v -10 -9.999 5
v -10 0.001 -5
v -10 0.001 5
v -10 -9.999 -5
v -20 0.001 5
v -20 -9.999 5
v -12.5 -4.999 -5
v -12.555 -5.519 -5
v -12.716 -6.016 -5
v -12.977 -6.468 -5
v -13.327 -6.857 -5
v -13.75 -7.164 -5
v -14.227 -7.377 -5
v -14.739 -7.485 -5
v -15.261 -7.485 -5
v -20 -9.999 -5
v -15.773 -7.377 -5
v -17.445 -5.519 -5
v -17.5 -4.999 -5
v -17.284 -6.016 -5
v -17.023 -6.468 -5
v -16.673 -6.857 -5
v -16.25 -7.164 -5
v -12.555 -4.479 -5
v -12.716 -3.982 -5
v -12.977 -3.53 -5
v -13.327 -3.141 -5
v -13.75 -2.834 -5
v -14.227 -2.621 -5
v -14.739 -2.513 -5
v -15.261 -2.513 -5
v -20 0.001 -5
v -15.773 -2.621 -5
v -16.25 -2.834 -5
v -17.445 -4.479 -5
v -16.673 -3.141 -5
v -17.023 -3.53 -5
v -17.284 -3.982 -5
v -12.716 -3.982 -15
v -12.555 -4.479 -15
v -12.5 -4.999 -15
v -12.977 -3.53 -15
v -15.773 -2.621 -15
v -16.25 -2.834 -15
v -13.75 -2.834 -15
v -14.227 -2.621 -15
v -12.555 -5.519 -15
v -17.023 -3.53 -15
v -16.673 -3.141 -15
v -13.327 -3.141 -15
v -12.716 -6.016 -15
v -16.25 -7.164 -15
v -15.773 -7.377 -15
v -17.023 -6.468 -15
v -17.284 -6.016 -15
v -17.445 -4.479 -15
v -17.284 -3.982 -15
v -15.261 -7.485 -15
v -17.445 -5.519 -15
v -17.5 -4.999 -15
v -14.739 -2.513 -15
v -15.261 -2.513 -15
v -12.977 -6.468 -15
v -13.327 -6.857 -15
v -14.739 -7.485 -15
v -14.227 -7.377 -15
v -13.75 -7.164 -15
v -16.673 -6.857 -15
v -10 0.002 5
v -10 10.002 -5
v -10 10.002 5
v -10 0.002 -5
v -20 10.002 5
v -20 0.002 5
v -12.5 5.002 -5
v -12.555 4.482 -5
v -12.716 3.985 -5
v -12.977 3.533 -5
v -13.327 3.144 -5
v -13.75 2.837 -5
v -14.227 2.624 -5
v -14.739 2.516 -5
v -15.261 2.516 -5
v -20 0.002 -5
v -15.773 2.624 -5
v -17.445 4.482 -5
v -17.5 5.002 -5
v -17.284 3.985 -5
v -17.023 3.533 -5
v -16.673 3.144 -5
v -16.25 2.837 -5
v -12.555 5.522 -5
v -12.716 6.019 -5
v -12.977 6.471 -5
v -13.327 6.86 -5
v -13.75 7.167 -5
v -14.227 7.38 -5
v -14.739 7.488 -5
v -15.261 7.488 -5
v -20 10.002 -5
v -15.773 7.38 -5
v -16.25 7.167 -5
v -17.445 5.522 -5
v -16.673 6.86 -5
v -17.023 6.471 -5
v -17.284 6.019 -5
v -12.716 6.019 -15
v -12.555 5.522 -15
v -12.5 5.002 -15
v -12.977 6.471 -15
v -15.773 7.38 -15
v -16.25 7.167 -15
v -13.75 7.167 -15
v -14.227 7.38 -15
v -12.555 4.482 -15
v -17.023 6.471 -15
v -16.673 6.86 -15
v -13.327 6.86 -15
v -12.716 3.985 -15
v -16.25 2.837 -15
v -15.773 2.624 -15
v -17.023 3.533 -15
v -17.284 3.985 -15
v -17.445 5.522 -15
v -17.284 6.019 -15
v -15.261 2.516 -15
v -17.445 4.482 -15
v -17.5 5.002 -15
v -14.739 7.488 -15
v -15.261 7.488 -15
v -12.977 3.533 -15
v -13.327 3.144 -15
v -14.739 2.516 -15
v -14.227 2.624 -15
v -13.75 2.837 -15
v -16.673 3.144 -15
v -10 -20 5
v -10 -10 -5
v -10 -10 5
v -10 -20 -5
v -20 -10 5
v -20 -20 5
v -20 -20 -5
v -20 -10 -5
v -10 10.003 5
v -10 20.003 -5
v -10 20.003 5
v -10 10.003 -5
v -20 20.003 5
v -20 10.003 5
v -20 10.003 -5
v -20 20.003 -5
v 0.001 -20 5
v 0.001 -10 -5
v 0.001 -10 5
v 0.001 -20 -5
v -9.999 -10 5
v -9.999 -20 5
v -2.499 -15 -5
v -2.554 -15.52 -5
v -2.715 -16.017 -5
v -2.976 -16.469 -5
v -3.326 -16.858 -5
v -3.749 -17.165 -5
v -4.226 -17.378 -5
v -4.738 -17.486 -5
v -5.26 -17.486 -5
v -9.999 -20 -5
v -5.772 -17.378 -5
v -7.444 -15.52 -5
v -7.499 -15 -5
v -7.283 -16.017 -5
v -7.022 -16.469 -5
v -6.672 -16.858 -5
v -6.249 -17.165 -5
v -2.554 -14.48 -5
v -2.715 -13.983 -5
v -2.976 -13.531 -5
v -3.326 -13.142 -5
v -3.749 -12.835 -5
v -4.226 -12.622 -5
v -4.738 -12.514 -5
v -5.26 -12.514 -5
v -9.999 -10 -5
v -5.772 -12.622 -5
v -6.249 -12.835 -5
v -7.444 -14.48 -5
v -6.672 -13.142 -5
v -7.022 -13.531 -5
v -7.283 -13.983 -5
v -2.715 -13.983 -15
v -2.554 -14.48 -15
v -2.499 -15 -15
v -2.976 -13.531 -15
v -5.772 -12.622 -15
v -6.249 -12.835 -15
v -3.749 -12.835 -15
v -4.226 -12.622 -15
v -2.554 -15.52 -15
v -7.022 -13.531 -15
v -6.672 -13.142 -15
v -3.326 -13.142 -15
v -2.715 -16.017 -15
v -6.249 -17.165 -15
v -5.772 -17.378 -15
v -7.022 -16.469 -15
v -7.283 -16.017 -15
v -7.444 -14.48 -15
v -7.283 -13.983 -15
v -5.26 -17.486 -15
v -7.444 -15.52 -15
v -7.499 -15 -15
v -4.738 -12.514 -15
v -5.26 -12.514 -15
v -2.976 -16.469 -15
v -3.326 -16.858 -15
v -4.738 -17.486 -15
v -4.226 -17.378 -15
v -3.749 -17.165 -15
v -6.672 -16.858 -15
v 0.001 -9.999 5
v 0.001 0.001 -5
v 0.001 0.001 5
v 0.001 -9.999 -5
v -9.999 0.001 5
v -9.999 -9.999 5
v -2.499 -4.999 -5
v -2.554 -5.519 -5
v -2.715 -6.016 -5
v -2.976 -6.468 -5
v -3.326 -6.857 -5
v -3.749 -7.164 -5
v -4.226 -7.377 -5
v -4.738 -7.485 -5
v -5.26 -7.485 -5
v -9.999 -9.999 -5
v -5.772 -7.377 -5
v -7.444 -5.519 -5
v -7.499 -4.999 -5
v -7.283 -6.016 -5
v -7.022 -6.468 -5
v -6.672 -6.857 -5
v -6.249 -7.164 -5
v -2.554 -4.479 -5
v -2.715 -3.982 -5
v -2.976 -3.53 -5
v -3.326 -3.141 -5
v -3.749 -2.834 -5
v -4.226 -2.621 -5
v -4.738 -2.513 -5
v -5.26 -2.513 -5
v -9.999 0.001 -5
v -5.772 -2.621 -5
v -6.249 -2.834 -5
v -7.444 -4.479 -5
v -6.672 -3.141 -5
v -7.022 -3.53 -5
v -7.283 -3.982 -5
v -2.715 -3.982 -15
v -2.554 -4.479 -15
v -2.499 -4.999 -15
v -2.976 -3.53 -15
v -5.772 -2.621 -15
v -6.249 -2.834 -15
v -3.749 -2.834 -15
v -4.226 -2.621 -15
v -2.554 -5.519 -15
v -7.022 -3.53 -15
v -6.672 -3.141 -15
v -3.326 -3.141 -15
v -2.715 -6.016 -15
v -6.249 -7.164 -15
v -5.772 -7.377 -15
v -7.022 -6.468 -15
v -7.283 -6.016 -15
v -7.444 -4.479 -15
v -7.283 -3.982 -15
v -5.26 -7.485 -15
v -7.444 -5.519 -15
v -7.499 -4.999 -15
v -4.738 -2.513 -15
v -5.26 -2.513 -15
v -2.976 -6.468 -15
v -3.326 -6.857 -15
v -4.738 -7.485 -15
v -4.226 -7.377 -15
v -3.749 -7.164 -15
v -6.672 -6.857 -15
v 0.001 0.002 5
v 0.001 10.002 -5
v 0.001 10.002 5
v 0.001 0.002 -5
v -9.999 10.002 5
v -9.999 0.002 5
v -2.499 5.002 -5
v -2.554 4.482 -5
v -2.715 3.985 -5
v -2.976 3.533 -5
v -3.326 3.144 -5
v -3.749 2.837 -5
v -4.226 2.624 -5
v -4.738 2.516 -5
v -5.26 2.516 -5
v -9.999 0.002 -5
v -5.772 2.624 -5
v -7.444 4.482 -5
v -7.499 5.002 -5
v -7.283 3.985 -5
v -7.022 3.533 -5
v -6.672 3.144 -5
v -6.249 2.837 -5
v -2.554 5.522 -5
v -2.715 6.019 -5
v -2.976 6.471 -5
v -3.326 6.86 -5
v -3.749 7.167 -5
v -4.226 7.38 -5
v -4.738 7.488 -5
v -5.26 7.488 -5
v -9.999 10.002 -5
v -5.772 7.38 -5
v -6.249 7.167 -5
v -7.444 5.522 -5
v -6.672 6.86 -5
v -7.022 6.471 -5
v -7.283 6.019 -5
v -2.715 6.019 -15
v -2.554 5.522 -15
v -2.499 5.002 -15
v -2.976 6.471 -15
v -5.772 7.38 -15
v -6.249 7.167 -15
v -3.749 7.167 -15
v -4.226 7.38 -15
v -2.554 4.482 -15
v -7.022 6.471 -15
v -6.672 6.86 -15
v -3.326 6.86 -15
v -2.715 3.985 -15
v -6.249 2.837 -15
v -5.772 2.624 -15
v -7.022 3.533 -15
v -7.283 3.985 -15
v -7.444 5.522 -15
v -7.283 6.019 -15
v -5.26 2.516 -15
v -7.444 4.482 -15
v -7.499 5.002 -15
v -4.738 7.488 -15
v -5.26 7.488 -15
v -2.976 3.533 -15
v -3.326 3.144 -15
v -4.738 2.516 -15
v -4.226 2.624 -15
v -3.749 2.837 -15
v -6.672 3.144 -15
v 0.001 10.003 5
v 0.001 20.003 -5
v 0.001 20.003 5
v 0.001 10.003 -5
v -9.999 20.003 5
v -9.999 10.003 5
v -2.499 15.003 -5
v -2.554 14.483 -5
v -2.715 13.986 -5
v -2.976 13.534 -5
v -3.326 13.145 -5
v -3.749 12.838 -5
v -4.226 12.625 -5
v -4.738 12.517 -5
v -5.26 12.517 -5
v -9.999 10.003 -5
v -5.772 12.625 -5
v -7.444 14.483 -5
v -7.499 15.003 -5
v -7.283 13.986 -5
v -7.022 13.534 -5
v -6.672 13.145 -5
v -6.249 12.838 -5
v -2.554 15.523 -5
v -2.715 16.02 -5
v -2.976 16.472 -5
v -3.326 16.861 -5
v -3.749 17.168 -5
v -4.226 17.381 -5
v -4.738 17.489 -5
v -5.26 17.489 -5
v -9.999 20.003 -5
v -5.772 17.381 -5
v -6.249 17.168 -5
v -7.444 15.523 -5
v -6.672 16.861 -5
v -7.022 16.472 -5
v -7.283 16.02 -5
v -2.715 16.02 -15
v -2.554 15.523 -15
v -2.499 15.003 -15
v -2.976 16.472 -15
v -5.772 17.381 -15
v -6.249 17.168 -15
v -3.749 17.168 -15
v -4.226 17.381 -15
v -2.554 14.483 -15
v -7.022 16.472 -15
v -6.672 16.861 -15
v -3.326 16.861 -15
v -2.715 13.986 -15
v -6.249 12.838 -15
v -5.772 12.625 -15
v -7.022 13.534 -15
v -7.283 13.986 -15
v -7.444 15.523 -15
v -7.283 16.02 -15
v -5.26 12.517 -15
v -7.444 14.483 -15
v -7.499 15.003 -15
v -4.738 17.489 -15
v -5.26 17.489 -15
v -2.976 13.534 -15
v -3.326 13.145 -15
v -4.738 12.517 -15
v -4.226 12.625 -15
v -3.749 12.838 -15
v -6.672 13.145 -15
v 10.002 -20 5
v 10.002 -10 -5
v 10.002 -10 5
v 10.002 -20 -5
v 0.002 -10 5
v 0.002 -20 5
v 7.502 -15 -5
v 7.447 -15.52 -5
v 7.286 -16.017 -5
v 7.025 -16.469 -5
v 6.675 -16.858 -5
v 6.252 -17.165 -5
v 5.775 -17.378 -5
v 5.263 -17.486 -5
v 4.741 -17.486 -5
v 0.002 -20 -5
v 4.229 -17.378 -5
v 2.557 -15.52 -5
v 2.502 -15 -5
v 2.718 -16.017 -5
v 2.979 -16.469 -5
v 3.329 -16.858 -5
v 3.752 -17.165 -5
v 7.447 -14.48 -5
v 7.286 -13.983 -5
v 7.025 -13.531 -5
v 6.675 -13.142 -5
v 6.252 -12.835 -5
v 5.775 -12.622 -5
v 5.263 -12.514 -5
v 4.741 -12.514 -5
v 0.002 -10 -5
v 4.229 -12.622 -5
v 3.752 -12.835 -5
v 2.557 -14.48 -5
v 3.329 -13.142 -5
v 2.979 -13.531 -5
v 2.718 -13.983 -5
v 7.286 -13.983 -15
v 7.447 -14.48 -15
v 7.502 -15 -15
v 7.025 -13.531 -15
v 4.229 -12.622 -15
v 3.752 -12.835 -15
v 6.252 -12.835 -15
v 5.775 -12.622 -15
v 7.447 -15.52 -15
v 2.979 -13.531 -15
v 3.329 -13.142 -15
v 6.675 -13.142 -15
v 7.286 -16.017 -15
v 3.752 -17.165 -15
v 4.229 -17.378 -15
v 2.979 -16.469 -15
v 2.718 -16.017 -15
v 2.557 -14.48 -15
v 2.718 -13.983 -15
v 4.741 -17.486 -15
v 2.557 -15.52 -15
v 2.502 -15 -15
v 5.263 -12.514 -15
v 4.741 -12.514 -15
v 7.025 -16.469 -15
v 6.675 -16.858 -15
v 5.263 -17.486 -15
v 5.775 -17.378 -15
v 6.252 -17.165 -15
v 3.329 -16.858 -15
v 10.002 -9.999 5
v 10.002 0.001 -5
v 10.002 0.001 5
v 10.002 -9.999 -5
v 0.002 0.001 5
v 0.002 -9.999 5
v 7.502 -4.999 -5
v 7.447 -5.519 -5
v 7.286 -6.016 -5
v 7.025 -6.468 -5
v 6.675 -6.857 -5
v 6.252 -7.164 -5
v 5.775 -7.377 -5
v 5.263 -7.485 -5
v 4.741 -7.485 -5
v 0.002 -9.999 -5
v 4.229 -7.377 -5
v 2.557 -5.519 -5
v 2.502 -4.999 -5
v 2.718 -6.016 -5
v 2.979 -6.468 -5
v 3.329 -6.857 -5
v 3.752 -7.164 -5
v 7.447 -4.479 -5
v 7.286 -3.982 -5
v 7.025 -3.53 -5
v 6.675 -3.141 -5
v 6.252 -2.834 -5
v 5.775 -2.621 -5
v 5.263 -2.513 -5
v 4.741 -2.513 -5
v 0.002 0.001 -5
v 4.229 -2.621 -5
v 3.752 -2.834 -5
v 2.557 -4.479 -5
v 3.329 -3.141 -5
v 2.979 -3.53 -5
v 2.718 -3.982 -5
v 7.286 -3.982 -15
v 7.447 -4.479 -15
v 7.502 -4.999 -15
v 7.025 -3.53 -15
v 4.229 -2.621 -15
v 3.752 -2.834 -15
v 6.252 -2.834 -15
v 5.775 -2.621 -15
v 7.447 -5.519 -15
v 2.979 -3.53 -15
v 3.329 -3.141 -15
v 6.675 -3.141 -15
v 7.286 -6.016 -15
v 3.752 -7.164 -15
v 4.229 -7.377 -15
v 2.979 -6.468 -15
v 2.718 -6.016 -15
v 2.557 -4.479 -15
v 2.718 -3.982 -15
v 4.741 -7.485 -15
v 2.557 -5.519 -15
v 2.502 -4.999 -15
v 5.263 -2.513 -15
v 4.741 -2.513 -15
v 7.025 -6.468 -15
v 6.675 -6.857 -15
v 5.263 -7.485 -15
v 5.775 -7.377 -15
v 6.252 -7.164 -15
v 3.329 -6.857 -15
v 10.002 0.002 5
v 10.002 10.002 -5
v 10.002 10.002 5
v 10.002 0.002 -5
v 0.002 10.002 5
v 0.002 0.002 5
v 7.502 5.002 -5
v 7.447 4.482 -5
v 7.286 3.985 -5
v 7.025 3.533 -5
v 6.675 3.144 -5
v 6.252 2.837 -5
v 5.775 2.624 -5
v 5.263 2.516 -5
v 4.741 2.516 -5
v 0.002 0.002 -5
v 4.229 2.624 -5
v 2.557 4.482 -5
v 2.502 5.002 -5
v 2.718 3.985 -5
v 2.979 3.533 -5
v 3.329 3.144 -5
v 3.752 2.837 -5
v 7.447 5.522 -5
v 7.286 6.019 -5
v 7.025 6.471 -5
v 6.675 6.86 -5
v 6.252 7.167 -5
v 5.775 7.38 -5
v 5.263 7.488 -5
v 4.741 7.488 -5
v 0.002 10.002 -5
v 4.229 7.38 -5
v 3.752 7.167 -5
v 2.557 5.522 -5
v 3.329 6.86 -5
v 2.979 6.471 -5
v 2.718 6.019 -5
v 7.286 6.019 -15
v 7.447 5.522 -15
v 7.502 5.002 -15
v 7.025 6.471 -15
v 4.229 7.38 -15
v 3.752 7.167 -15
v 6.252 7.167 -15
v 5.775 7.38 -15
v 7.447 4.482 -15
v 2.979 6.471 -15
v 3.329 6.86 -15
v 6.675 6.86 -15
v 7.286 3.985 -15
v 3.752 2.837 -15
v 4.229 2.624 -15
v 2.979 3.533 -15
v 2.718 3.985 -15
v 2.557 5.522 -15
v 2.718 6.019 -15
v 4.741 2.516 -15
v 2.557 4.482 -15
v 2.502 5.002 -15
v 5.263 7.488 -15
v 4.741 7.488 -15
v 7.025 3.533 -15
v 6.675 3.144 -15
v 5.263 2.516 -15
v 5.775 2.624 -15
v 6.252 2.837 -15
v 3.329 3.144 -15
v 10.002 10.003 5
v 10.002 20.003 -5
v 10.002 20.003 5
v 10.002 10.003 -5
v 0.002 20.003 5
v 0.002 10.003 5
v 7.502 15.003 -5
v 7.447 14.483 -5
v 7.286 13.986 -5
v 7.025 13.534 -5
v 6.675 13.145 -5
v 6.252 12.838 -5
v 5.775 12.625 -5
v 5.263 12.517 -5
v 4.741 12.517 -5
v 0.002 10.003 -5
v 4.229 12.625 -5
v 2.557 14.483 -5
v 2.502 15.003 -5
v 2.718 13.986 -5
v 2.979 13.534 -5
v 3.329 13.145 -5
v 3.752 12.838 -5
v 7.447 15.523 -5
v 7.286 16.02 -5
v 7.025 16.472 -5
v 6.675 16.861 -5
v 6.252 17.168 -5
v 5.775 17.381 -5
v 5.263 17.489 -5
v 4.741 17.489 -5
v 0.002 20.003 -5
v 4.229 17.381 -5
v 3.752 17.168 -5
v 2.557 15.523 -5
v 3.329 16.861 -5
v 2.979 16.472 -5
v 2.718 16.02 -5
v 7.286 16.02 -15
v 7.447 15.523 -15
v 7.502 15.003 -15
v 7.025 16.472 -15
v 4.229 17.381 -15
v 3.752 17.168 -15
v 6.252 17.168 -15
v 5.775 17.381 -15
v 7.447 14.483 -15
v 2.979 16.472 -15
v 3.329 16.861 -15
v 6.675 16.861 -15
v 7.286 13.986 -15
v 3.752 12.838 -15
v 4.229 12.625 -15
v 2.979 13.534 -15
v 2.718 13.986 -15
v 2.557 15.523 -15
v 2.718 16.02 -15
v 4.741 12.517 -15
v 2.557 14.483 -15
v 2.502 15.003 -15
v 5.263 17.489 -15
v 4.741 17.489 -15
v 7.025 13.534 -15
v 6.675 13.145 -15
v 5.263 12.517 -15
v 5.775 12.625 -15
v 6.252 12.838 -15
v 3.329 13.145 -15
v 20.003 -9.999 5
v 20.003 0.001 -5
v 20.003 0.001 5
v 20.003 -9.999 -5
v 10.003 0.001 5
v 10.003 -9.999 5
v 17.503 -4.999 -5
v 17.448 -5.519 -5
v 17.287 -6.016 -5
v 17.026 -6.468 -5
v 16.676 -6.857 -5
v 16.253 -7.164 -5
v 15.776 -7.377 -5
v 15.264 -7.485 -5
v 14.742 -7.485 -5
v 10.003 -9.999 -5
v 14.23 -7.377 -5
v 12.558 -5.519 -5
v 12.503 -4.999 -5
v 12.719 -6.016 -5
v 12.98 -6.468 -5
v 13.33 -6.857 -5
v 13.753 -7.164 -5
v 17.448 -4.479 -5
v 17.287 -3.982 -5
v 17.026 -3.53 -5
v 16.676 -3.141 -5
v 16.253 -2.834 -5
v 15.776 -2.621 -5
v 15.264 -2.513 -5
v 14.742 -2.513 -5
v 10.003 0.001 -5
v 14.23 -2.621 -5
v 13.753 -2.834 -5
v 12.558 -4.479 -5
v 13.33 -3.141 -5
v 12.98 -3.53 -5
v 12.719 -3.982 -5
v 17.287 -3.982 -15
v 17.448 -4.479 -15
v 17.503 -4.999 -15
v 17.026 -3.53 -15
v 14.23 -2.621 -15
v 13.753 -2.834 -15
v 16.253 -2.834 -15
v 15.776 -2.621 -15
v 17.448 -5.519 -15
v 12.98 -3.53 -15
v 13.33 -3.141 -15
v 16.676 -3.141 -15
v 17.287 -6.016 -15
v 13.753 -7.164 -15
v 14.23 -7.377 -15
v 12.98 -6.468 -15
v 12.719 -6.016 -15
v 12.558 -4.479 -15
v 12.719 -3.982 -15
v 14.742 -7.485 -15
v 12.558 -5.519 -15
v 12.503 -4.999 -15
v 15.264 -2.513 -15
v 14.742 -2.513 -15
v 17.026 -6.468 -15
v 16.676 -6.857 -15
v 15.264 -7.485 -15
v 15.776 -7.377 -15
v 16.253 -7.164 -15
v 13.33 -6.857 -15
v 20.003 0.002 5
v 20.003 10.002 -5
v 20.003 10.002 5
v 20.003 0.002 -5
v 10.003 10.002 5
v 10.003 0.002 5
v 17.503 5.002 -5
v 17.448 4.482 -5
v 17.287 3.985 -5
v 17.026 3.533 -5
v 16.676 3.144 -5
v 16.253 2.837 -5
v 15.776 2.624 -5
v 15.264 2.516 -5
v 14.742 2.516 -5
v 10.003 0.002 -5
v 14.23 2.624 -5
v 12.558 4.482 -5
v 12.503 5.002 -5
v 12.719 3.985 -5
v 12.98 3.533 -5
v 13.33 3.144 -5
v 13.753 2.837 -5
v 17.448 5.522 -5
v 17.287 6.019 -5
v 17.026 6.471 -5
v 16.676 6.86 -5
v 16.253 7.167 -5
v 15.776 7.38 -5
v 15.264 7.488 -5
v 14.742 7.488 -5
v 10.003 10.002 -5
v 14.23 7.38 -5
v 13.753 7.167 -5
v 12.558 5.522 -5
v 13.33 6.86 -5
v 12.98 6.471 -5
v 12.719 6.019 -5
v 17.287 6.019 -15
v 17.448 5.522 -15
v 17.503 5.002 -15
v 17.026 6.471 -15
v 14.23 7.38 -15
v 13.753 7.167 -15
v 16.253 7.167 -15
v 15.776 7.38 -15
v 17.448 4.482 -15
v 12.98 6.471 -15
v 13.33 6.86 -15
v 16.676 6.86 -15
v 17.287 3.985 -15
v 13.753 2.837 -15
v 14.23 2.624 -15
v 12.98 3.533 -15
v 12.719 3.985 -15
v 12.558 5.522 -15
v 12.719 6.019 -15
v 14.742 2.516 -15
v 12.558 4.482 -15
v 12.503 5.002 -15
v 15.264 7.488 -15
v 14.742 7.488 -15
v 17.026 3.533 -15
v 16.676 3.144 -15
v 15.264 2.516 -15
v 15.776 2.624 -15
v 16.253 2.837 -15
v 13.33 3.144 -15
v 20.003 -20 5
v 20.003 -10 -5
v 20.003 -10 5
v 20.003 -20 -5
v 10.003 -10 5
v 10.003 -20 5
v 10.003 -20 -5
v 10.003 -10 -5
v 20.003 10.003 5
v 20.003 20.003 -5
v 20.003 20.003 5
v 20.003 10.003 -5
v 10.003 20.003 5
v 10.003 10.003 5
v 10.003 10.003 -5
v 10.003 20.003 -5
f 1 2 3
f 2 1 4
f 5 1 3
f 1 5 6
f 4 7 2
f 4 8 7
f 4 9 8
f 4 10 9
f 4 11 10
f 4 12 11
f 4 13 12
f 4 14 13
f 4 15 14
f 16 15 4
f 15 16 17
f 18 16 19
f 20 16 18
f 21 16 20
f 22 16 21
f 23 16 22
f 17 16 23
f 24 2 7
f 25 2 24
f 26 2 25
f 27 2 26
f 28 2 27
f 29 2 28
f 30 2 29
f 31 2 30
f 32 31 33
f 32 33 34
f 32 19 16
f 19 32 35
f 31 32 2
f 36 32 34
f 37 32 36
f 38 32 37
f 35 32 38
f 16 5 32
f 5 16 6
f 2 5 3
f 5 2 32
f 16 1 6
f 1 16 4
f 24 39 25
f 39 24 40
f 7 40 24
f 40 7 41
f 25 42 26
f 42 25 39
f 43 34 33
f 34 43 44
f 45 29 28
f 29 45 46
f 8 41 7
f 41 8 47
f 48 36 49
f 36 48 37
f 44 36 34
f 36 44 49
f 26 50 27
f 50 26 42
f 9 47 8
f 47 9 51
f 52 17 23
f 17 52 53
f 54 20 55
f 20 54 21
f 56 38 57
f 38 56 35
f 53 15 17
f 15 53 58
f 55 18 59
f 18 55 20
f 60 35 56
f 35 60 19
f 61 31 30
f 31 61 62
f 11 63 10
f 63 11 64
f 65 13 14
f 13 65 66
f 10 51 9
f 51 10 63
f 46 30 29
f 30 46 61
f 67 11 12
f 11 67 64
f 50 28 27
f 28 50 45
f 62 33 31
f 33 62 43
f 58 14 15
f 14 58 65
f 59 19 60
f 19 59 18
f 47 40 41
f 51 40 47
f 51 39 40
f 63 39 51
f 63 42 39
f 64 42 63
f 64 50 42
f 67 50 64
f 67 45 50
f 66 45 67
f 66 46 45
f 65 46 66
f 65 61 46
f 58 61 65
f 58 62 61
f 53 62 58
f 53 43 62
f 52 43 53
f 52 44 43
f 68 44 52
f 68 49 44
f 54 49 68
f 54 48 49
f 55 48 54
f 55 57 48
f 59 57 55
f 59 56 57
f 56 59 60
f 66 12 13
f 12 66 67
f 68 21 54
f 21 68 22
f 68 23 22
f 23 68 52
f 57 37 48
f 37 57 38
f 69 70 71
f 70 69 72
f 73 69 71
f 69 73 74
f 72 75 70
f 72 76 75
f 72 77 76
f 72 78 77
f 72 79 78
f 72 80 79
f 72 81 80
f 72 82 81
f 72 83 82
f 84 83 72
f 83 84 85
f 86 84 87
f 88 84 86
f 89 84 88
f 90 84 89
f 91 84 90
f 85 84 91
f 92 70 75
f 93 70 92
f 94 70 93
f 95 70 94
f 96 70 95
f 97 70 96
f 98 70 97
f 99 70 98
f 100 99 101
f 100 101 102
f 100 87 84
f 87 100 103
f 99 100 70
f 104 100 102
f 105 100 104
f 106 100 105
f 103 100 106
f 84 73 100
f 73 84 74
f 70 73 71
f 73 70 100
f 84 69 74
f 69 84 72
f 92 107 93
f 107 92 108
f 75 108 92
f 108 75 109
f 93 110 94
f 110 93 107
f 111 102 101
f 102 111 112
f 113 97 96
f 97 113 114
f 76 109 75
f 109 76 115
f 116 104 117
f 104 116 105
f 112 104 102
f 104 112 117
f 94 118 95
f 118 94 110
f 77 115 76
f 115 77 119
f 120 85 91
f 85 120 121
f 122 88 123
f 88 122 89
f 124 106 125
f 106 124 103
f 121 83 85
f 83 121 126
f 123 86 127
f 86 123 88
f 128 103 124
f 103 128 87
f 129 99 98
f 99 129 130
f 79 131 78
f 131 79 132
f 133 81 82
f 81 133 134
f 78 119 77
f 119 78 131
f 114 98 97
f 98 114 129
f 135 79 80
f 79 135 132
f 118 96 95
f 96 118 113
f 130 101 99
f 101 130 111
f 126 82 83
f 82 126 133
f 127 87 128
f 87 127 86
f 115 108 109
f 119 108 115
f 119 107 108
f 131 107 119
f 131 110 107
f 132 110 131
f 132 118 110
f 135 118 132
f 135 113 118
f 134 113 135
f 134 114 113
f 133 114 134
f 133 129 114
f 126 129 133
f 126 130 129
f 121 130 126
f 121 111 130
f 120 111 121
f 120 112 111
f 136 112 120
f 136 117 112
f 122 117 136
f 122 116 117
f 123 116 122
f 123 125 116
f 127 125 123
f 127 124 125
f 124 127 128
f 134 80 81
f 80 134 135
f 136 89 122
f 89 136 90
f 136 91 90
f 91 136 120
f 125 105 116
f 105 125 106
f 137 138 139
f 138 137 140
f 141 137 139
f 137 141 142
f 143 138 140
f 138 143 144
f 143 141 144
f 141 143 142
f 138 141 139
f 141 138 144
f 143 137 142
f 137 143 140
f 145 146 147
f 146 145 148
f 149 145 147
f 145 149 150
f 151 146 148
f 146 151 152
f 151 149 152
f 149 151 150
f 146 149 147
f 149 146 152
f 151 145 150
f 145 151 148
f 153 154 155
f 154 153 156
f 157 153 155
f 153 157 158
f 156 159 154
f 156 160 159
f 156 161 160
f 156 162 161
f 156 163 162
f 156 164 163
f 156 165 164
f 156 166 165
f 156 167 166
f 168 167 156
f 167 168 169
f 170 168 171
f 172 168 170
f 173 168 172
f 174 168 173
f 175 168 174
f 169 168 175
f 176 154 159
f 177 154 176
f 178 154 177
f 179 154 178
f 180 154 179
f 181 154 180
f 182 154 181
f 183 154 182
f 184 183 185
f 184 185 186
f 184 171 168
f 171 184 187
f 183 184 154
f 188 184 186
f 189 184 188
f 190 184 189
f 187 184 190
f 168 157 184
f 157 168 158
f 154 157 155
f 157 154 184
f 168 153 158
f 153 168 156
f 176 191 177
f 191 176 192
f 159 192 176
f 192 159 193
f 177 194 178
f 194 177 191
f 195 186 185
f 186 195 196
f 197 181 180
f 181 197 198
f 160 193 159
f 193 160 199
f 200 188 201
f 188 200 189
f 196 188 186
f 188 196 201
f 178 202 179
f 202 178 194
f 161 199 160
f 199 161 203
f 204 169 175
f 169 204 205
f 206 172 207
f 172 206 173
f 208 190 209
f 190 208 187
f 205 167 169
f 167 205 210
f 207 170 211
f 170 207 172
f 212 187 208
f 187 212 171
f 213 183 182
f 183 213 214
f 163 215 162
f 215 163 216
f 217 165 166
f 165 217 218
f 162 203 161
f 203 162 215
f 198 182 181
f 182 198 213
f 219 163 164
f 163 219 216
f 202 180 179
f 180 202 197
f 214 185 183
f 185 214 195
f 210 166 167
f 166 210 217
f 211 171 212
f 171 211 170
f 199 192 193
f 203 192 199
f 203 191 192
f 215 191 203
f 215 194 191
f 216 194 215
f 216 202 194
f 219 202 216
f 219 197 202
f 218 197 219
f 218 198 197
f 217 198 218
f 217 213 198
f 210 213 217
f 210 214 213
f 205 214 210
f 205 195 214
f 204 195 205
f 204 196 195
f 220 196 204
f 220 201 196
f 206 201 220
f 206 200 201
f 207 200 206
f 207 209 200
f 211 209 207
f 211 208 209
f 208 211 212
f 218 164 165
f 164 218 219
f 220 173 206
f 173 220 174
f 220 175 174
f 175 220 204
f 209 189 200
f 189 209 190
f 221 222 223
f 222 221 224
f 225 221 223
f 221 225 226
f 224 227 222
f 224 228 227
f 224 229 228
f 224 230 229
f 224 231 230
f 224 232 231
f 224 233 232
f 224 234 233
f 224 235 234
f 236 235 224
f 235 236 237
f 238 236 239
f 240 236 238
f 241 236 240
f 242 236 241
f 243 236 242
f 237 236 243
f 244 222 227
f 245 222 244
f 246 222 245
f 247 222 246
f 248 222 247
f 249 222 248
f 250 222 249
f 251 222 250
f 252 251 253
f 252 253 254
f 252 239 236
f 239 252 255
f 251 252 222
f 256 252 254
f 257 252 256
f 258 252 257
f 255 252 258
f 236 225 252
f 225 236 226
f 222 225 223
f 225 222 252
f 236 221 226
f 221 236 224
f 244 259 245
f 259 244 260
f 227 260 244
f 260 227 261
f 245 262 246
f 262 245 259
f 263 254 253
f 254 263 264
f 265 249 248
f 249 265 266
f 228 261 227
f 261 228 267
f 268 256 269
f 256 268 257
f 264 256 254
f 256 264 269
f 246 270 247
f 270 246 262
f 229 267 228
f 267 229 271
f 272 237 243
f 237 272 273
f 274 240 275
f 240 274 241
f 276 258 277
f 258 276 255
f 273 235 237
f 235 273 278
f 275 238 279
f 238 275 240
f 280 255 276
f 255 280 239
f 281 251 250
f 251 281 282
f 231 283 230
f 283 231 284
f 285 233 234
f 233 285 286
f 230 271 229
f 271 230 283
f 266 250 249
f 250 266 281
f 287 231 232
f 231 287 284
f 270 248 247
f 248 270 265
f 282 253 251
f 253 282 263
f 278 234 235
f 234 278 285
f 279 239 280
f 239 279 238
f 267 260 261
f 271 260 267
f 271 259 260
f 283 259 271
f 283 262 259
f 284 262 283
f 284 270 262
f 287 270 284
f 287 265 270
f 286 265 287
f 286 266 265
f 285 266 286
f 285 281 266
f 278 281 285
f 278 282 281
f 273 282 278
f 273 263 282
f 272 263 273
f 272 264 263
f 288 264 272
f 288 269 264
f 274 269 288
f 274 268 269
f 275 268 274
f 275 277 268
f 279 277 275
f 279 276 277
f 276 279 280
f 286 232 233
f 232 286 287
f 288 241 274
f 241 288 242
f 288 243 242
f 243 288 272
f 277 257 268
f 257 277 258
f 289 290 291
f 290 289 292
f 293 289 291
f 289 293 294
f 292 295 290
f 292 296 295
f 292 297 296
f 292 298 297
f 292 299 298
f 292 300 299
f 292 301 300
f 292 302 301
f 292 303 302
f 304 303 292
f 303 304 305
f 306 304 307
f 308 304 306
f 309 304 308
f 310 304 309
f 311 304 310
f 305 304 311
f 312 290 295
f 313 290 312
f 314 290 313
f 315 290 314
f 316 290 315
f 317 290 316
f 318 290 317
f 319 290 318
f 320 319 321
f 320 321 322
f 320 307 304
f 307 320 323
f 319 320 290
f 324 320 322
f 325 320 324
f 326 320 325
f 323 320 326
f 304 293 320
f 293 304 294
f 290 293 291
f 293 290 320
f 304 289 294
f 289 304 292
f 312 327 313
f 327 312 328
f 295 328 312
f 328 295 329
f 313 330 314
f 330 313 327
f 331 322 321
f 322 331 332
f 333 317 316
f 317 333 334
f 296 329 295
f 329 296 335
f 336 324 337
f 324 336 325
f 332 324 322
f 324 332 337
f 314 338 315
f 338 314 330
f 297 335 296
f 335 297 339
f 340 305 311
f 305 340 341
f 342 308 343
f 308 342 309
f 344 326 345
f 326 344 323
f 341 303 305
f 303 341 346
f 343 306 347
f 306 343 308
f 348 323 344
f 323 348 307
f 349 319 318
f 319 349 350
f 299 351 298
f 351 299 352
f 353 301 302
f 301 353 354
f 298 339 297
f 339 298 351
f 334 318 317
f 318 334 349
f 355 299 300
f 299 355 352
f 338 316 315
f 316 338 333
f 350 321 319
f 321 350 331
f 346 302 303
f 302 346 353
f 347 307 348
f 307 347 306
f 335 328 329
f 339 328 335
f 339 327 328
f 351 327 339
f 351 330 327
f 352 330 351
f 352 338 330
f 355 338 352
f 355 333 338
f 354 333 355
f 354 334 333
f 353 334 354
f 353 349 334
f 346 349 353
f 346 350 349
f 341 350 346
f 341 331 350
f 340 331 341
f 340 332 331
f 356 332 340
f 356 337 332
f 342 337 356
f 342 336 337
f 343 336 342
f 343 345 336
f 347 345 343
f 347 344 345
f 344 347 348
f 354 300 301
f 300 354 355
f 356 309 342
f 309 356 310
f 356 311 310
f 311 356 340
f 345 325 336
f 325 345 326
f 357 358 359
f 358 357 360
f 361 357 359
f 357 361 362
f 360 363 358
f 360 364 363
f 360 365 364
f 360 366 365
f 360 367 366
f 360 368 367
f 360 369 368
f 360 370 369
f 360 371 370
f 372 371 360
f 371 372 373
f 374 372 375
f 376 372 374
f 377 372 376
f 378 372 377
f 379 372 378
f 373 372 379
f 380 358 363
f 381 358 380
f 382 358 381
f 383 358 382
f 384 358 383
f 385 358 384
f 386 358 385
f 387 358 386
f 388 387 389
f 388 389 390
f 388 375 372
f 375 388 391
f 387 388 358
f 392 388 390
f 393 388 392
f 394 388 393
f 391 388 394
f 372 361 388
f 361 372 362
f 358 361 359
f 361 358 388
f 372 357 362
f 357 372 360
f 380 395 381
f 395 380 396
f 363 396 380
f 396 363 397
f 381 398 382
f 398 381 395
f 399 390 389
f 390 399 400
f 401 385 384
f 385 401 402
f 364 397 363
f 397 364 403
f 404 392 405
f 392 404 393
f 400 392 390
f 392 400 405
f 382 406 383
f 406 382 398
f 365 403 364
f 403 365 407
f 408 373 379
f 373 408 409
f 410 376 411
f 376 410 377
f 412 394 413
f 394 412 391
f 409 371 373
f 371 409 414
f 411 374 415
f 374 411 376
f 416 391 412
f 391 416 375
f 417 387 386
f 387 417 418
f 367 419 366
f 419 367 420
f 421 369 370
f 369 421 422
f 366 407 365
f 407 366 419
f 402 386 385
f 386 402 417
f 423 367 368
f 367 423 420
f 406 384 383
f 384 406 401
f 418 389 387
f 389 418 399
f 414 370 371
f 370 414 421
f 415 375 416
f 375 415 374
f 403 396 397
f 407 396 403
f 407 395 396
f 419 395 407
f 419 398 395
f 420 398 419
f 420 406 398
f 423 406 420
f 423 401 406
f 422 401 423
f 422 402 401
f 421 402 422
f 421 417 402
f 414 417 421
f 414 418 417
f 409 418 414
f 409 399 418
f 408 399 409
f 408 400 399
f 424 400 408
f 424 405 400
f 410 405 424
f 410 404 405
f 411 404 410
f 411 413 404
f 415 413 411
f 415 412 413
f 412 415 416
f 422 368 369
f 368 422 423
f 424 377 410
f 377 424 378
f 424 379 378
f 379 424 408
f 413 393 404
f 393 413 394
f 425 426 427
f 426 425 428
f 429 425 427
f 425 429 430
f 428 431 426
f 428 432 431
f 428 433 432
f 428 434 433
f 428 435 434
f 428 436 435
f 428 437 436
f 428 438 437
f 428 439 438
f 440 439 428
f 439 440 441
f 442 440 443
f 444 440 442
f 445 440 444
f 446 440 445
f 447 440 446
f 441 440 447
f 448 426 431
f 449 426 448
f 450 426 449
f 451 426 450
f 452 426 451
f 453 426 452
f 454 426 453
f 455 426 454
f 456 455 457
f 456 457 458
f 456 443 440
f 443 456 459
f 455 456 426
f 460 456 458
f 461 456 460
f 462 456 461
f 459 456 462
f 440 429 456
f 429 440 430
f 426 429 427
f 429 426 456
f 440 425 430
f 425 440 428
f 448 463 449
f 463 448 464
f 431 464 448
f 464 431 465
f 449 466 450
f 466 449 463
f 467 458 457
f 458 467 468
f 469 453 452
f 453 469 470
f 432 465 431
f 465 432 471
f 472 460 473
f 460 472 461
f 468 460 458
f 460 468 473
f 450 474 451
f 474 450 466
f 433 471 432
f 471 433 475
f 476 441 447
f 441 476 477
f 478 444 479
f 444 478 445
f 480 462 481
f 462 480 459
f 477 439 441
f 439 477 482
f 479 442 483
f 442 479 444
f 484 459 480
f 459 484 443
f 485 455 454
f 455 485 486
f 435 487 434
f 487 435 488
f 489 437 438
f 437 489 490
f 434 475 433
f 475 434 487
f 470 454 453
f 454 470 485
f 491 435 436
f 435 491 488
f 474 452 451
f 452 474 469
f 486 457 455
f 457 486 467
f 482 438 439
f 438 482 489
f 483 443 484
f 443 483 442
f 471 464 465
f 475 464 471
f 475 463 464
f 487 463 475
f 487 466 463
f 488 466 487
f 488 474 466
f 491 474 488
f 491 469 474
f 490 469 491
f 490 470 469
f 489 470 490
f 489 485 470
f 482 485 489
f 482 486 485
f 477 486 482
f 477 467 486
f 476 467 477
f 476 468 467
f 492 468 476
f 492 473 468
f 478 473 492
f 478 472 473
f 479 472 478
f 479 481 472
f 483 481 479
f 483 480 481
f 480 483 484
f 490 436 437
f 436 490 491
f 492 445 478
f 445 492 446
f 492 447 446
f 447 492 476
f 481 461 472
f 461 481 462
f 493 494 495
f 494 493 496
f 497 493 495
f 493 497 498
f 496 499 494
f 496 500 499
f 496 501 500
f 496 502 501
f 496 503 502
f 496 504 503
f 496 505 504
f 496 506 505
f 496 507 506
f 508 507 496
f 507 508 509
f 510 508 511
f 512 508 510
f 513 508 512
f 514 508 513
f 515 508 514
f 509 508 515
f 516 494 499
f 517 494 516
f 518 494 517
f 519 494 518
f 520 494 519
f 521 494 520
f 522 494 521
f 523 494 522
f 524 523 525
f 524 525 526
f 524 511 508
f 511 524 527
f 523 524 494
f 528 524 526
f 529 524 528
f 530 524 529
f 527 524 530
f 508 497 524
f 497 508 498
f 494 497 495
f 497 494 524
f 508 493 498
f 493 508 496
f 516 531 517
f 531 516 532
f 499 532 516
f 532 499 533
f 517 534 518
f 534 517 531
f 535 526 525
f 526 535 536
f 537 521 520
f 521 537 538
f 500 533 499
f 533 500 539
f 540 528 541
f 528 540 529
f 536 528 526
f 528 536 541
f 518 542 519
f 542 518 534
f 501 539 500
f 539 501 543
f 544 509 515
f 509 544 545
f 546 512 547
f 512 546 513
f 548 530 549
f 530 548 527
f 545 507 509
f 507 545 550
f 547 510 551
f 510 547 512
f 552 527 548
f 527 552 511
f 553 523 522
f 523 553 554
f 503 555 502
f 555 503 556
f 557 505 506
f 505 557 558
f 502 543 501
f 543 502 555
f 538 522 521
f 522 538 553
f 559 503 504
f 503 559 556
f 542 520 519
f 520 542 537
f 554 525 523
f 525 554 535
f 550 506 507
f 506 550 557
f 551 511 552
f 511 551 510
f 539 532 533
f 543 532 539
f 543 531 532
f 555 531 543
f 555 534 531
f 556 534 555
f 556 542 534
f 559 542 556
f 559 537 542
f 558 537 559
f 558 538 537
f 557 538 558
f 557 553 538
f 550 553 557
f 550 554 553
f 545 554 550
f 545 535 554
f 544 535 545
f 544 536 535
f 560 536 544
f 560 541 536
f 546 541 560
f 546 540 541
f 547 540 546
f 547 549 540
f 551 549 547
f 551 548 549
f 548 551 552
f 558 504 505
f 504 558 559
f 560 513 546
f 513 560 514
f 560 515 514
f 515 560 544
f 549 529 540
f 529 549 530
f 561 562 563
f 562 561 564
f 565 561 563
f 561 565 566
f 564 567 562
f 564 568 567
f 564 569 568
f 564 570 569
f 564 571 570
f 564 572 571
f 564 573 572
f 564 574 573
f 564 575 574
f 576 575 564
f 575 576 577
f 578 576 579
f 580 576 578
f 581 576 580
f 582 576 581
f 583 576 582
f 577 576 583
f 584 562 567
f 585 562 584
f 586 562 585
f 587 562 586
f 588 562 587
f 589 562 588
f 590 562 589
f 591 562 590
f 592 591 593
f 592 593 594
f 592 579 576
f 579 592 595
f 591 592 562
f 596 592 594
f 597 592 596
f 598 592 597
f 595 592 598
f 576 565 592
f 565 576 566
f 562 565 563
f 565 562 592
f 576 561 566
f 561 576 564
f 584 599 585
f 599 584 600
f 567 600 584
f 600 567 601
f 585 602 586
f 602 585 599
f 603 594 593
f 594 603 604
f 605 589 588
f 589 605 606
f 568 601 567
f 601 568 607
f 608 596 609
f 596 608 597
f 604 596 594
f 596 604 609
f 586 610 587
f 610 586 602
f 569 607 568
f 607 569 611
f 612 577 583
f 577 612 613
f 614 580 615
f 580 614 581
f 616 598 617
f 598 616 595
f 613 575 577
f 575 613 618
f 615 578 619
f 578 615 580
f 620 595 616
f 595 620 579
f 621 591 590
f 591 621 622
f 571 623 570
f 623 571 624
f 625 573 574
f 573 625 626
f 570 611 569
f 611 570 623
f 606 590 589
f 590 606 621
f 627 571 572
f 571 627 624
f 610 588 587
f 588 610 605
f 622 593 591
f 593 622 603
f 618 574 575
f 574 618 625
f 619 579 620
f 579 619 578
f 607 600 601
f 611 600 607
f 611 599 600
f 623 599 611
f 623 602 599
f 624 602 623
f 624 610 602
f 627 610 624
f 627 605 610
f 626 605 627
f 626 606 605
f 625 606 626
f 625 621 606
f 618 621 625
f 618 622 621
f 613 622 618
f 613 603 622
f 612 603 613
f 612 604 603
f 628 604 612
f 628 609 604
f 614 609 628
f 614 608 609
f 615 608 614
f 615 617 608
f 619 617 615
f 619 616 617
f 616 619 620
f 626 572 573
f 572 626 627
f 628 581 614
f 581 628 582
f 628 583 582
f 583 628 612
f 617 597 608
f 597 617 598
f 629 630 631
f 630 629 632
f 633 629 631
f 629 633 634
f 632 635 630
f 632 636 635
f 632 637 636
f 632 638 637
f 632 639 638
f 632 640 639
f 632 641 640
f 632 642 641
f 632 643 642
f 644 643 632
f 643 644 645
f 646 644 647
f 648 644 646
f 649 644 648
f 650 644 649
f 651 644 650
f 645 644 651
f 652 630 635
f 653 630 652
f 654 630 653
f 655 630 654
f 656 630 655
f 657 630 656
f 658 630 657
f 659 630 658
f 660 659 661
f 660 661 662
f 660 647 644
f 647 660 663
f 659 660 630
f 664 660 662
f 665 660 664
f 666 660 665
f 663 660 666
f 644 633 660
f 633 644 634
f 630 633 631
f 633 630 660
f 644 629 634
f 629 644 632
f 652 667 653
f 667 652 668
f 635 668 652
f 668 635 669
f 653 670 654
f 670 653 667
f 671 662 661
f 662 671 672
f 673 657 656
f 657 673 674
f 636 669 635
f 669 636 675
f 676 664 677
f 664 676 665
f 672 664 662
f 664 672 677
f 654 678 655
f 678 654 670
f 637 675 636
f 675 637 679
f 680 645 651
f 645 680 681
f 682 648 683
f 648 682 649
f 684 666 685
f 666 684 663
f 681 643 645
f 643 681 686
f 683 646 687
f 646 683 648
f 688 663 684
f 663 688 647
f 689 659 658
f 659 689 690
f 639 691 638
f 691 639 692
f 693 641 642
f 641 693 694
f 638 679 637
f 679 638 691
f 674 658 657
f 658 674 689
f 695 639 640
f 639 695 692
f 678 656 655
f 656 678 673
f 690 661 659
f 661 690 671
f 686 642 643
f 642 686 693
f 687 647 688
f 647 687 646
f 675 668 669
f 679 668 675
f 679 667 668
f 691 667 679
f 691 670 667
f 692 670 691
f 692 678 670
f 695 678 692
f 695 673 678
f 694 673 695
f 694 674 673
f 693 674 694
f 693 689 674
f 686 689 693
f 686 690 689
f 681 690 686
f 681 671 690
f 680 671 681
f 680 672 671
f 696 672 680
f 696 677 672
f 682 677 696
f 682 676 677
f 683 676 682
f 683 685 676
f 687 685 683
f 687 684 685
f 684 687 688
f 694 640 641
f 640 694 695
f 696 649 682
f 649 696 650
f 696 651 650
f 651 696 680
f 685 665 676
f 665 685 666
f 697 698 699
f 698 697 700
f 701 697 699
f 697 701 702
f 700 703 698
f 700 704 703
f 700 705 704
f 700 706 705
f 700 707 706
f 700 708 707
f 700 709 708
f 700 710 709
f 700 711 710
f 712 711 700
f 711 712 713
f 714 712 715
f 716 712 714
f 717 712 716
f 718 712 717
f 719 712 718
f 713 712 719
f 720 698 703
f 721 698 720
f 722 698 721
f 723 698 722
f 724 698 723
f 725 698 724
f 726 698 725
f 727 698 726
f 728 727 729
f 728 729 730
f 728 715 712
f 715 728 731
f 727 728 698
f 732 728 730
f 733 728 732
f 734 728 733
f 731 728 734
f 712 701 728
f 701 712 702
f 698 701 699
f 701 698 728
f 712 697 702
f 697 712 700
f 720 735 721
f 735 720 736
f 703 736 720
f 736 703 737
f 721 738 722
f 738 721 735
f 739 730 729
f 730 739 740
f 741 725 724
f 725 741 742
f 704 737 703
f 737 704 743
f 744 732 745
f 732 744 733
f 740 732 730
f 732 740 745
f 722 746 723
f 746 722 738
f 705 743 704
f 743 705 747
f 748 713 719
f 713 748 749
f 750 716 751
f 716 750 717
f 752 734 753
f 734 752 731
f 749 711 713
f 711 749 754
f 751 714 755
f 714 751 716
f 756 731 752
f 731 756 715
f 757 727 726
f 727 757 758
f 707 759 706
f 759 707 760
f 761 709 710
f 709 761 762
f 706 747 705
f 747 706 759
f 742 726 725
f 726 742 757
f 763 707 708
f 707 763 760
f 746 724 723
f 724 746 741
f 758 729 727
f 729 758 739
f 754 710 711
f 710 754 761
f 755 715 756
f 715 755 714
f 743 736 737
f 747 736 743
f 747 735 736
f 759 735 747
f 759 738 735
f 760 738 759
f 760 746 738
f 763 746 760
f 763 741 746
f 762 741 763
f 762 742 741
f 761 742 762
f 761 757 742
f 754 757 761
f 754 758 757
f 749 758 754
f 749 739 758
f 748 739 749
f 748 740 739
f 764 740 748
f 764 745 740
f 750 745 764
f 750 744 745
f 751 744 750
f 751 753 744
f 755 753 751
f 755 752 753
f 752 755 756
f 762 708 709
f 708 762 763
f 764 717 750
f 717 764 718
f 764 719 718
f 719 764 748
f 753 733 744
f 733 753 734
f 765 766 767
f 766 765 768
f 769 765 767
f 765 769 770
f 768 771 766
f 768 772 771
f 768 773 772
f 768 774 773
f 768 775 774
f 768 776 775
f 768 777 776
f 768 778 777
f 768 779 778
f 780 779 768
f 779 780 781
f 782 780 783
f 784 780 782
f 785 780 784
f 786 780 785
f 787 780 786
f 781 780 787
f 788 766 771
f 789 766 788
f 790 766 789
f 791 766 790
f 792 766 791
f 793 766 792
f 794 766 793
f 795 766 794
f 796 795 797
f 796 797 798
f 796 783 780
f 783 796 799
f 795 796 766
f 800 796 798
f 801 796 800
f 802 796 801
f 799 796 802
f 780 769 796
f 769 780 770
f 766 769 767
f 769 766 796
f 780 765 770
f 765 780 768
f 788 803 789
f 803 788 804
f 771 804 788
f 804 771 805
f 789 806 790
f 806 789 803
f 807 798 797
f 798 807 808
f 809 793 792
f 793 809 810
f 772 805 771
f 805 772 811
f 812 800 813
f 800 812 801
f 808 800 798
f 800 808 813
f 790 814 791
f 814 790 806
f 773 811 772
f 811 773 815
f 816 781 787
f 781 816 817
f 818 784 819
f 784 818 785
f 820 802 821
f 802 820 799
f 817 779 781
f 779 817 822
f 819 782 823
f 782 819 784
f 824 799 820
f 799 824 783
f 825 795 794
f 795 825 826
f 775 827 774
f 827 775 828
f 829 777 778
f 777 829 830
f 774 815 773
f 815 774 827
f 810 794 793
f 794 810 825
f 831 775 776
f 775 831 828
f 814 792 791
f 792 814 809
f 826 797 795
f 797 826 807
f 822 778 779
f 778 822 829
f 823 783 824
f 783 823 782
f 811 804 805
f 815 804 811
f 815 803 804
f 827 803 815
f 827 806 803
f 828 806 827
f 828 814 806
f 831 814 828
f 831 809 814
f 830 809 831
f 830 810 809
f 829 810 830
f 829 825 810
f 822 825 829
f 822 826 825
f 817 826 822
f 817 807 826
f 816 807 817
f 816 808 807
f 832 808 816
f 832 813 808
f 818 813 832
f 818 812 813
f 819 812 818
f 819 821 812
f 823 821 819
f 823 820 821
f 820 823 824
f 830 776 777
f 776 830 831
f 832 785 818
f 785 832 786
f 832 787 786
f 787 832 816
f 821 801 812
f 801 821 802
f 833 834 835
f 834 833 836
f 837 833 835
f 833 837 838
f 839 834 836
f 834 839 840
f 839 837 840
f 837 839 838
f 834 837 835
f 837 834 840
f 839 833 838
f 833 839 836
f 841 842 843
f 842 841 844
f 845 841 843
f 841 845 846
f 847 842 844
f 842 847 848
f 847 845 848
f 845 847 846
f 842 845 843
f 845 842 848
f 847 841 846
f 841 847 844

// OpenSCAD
// file: libthtcomponent.scad
/*
 *  Copyright 2025 AGH Center of Excellence in Artificial Intelligence
 *
 *  Licensed under the Apache License, Version 2.0 (the "License");
 *  you may not use this file except in compliance with the License.
 *  You may obtain a copy of the License at
 *
 *      http://www.apache.org/licenses/LICENSE-2.0
 *
 *  Unless required by applicable law or agreed to in writing, software
 *  distributed under the License is distributed on an "AS IS" BASIS,
 *  WITHOUT WARRANTIES OR CONDITIONS OF ANY KIND, either express or implied.
 *  See the License for the specific language governing permissions and
 *  limitations under the License.
 */

EPS = 0.001;

/* Makes a single block with attachable peg as a children
- Args:
- @block_side: num - the side dimension of the graspable block
- @block_height: num - the height of the graspable block
- @with_peg: bool - flag to attach peg to the block
*/
module tht_pin_block(block_side, block_height, peg = true)
{
    // Block
    cube([block_side, block_side, block_height], center = true);
    // Peg
    if (peg) {
        translate([0, 0, -block_height / 2])
            children(0);
    }
};
// file: libpeginhole.scad
/*
 *  Copyright 2024-2025 AGH Center of Excellence in Artificial Intelligence
 *
 *  Licensed under the Apache License, Version 2.0 (the "License");
 *  you may not use this file except in compliance with the License.
 *  You may obtain a copy of the License at
 *
 *      http://www.apache.org/licenses/LICENSE-2.0
 *
 *  Unless required by applicable law or agreed to in writing, software
 *  distributed under the License is distributed on an "AS IS" BASIS,
 *  WITHOUT WARRANTIES OR CONDITIONS OF ANY KIND, either express or implied.
 *  See the License for the specific language governing permissions and
 *  limitations under the License.
 */
EPS = 0.001;

function circle_coordinate(x, r, p) = [ r * cos(x + p), r *sin(x + p) ];
function regular_shape_vertices(n = 3, r = 1, phase = 0) = [for (t = [0:360 / n:360 - EPS]) circle_coordinate(t, r, phase)];

function hole_diameter(vertices, peg_diameter, tolerance = 0) = tolerance + peg_diameter * cos(180 / vertices);
function angle_offset(vertices) = (360 / vertices) / 2;


/* Makes a single peg in form of regular prism
-  Args:
- @vertices: int - number of the base polygon vertices
- @diameter: num - the diameter of the circle to construct the vertices
- @height: num - the height of the prism
- @angle_offset: num - rotation of all vertices
- @is_cylinder: bool - flag to convert prism into cylinder
*/
module regular_prism(vertices, diameter, height, angle_offset, is_cylinder = false)
{
	if (is_cylinder) {
		cylinder(h = height, r = diameter / 2, center = true);
	} else if (vertices < 3) {
		echo("ERROR: Can't construct polygon with less than 3 vertices!");
	} else {
		linear_extrude(height = height, center = true) {
			if (vertices == 4) {
				square(diameter / sqrt(2), center = true);
			} else {
				points = regular_shape_vertices(n = vertices, r = diameter / 2, phase = angle_offset);
				polygon(points);
			}
		}
	}
}

/* Makes a single peghole
-  Args:
- @slot_size: num - the side of the box
- @depth: num - the thickness of the surface for insertion
- @height: num - the height of the whole box
- @leg_width: num - the side of the supporting legs
*/
module single_insertion_box(slot_size, depth, height, leg_width) {
	difference() {
		// Insertion surface
		cube([ slot_size, slot_size, height ], center = true);

		// Clearance (4 legs)
		translate([ 0, 0, -depth ]) cube([ slot_size + EPS, slot_size - 2 * leg_width, height ], center = true);
		translate([ 0, 0, -depth ]) cube([ slot_size - 2 * leg_width, slot_size + EPS, height ], center = true);

		// Peghole
		children(0);
	}
}

/* Makes multiple pegholes
-  Args:
- @slot_size: num - the side of the box
- @array_size: vec[int, int] - array dimensions of the holes grid
- @depth: num - the thickness of the surface for insertion
- @height: num - the height of the whole box
- @leg_width: num - the side of the supporting legs
*/
module multiple_insertion_box(slot_size, array_size, depth, height, leg_width) {
	box_dims = slot_size * array_size;
	difference() {
		// Insertion surface
		cube([ box_dims.x, box_dims.y, height ], center = true);

		// Clearance (4 legs)
		translate([ 0, 0, -depth ]) cube([ box_dims.x + EPS, box_dims.y - 2 * leg_width, height ], center = true);
		translate([ 0, 0, -depth ]) cube([ box_dims.x - 2 * leg_width, box_dims.y + EPS, height ], center = true);

		// Pegholes array
		array_offset = -box_dims / 2 + [ slot_size, slot_size ] / 2;
		for (cnt_y = [0:1:array_size.y - EPS]) {
			for (cnt_x = [0:1:array_size.x - EPS]) {
				dx = slot_size * cnt_x;
				dy = slot_size * cnt_y;
				child_idx = ((cnt_y * array_size.x) + cnt_x) % $children;

				translate([ array_offset.x + dx, array_offset.y + dy, 0 ]) children(child_idx);
			}
		}
	}
}
// main file
/*
 *  Copyright 2025 AGH Center of Excellence in Artificial Intelligence
 *
 *  Licensed under the Apache License, Version 2.0 (the "License");
 *  you may not use this file except in compliance with the License.
 *  You may obtain a copy of the License at
 *
 *      http://www.apache.org/licenses/LICENSE-2.0
 *
 *  Unless required by applicable law or agreed to in writing, software
 *  distributed under the License is distributed on an "AS IS" BASIS,
 *  WITHOUT WARRANTIES OR CONDITIONS OF ANY KIND, either express or implied.
 *  See the License for the specific language governing permissions and
 *  limitations under the License.
 */
use<libpeginhole.scad>;
use<libthtcomponent.scad>;
$fs = 0.01;
EPS = 0.001;

box_side = 10;
box_height = 10;
with_peg = true;

pin_vertices = 5;
pin_diameter = box_side / 2;
pin_height = box_height * 2;
pin_is_cylinder = true;


// Parameters for the array
cols = 4; // Number of columns (x)
rows = 4; // Number of rows (y)
spacing = box_side + EPS; // Spacing between blocks
default_peg_value = true;

// Pairs of x (col) and y (row)
inverted_positions = [
    [0, 0],
    [3, 0],
    [0, 3],
    [3, 3],
];

// Function to check if a position is in the list
function is_2d_in_list(pos, inv_list) =
    max([for (p = inv_list) p[0] == pos[0] && p[1] == pos[1]]);

// Calculate total dimensions of the array
total_width = (cols - 1) * (spacing - EPS);
total_height = (rows - 1) * (spacing - EPS);

// Generate an array of tht_pin_block
// Center the array at (0, 0, 0)
translate([-total_width / 2, -total_height / 2, 0])
for (x = [0:cols-1]) {
    for (y = [0:rows-1]) {
        peg_value = is_2d_in_list([x, y], inverted_positions) ? !default_peg_value : default_peg_value;
        translate([x * spacing, y * spacing, 0])
        tht_pin_block(block_side = box_side, block_height = box_height, peg=peg_value)
        {
            regular_prism(vertices = pin_vertices, diameter = pin_diameter, height = pin_height, angle_offset = angle_offset(pin_vertices), is_cylinder = pin_is_cylinder);
        };
    }
}
